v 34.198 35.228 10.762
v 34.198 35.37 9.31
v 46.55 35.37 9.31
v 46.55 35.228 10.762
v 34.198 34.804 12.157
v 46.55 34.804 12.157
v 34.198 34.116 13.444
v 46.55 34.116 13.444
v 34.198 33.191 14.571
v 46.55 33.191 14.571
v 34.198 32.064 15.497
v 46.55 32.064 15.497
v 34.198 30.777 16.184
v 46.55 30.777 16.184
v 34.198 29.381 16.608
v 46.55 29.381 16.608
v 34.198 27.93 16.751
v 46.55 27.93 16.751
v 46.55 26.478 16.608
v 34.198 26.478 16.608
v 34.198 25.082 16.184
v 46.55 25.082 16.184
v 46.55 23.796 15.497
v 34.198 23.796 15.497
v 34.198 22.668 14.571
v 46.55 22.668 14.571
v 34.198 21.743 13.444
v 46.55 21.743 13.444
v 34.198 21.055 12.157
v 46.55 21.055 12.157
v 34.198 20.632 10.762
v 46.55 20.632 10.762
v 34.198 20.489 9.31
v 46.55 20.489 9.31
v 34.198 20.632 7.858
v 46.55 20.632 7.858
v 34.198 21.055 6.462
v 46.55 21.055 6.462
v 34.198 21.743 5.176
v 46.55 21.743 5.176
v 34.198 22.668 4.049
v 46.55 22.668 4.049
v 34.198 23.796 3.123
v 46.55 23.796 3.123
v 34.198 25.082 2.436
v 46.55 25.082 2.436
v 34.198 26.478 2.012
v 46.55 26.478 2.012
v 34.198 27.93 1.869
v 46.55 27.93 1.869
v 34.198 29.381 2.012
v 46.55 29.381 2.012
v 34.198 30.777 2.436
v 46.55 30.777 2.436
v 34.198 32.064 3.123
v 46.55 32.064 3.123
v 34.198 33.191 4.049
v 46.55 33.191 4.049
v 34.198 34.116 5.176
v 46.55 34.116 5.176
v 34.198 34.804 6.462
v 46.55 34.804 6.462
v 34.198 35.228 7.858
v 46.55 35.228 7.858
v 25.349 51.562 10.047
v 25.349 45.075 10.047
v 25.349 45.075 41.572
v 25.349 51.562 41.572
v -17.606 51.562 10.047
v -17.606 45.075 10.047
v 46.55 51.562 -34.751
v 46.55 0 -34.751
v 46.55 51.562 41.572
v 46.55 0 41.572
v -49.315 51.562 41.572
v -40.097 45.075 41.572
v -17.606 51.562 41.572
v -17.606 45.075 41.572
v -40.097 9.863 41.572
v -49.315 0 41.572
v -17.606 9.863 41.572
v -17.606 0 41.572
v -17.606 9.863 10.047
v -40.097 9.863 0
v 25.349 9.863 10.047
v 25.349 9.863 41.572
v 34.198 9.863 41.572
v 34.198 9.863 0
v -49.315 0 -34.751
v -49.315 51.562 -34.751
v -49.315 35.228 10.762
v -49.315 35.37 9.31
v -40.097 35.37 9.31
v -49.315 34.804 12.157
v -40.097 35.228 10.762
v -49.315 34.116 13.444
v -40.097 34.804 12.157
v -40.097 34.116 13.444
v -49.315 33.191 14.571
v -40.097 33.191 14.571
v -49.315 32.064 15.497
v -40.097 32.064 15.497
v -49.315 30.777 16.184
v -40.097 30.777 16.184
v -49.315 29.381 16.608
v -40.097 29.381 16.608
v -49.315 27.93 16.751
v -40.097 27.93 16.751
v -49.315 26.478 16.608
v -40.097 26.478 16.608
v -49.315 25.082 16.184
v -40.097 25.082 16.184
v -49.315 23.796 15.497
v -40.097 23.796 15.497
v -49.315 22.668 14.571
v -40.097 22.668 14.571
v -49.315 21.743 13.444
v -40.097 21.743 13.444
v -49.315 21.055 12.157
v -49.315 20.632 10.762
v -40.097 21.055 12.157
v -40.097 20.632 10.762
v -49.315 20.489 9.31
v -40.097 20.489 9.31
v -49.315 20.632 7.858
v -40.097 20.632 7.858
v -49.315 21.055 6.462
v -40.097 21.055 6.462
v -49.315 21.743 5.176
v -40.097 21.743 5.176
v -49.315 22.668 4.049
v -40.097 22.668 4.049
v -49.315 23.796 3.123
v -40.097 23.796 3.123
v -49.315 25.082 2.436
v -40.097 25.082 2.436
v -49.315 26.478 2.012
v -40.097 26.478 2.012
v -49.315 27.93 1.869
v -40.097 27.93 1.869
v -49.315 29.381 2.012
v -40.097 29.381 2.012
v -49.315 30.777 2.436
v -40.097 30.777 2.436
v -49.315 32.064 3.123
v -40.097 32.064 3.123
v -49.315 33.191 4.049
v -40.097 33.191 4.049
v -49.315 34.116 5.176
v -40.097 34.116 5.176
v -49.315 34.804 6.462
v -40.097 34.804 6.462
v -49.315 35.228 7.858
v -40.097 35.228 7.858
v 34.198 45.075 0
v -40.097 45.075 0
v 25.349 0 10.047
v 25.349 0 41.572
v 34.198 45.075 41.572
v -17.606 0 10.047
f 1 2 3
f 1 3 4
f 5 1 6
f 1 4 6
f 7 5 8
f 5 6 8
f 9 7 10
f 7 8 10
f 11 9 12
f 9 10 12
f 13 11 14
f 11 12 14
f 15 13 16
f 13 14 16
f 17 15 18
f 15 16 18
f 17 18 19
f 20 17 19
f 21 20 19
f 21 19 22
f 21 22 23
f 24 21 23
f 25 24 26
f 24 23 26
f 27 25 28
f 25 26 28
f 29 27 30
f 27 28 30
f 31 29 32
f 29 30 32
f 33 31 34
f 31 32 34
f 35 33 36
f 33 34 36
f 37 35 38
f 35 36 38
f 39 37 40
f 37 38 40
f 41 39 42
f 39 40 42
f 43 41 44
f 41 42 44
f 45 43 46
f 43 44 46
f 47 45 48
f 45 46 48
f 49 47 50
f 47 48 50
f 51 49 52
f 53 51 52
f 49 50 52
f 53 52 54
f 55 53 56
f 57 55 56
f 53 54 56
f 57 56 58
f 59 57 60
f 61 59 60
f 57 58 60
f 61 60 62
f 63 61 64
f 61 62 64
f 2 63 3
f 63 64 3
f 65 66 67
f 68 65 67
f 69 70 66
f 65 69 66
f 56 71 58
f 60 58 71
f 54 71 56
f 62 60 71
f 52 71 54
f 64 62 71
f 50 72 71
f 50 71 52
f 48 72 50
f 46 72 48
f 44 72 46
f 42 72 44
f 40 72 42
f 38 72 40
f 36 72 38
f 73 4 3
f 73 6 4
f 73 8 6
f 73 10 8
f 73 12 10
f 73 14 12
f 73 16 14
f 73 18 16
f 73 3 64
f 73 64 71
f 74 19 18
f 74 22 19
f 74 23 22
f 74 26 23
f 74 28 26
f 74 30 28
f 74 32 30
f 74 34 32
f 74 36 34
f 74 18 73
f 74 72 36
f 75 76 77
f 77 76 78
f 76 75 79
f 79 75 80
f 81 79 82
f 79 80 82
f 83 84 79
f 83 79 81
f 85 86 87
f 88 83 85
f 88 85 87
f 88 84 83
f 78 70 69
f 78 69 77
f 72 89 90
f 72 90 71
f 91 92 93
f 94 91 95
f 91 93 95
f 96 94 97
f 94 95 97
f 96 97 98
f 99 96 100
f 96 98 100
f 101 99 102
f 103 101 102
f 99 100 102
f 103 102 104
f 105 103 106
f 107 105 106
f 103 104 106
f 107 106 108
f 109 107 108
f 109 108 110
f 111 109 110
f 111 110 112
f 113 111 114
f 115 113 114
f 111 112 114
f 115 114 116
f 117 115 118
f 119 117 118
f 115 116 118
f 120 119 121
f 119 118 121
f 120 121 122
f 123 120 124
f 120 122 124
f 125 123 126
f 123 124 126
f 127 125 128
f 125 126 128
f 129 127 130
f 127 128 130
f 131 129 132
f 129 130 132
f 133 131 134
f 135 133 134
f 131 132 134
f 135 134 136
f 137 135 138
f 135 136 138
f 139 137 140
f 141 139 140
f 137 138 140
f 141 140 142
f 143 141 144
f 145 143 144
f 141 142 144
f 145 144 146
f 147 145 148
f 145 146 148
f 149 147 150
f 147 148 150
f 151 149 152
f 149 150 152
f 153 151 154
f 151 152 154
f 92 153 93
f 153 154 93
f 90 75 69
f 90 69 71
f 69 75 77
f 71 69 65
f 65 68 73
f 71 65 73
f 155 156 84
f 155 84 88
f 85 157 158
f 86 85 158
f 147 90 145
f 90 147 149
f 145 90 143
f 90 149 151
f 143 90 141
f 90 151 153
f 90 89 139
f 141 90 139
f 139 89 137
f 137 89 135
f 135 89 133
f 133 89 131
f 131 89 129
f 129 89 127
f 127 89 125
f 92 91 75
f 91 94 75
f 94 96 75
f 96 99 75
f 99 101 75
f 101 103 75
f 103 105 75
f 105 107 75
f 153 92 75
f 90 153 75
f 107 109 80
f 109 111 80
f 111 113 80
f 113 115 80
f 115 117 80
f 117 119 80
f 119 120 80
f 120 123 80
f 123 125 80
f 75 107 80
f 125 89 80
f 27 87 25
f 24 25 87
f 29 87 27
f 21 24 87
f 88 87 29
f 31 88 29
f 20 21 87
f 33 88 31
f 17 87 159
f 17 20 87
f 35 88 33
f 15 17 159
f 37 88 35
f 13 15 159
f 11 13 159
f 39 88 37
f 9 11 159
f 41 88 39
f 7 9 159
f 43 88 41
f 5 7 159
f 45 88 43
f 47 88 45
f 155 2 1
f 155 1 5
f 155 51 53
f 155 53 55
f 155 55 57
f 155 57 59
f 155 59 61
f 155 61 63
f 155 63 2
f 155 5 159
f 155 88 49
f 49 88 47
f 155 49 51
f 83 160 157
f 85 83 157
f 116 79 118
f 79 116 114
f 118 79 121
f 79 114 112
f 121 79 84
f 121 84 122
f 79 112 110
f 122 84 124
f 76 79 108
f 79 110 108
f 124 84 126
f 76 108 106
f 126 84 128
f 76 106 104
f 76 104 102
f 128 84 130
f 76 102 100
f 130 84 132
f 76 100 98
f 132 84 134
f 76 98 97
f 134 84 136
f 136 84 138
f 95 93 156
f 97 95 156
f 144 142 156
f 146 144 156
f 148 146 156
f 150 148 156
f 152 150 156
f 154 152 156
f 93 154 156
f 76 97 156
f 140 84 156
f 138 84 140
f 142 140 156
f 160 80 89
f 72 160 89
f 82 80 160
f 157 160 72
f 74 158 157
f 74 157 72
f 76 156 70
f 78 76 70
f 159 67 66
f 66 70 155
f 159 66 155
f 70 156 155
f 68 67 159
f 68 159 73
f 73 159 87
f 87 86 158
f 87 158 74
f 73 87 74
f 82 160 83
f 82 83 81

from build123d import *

# Parameters (mm, degrees)
F0_W     = 95.8645157516
F0_H     = 76.322901994
F1_DEPTH = 51.562
F2_W     = 74.2949992418
F2_H     = 35.2117735893
F3_DEPTH = 73.152
F4_R     = 7.4407227367
F5_DEPTH = 53.34
F6_W     = 42.9546777159
F6_H     = 31.5246768296
F7_DEPTH = 57.912


with BuildPart() as f1:
    # F0 (on Front) → F1 (new body)
    with BuildSketch(Plane.XZ):
        with Locations((-1.3826619834, 3.4105647355)):
            Rectangle(F0_W, F0_H)
    extrude(amount=-F1_DEPTH)

    # F2 (on Top) → F3 (cut)
    with BuildSketch(Plane.XY):
        with Locations((-2.9496774077, 27.4688703939)):
            Rectangle(F2_W, F2_H)
    extrude(amount=F3_DEPTH, mode=Mode.SUBTRACT)

    # F4 (on Right) → F5 (cut, symmetric)
    with BuildSketch(Plane.YZ):
        with Locations((27.929758653, 9.309919551)):
            Circle(F4_R)
    extrude(amount=F5_DEPTH, both=True, mode=Mode.SUBTRACT)

    # F6 (on face) → F7 (cut)
    with BuildSketch(Plane.XZ):
        with Locations((3.871451132, 25.8096773177)):
            Rectangle(F6_W, F6_H)
    extrude(amount=-F7_DEPTH, mode=Mode.SUBTRACT)


solid = f1.part
